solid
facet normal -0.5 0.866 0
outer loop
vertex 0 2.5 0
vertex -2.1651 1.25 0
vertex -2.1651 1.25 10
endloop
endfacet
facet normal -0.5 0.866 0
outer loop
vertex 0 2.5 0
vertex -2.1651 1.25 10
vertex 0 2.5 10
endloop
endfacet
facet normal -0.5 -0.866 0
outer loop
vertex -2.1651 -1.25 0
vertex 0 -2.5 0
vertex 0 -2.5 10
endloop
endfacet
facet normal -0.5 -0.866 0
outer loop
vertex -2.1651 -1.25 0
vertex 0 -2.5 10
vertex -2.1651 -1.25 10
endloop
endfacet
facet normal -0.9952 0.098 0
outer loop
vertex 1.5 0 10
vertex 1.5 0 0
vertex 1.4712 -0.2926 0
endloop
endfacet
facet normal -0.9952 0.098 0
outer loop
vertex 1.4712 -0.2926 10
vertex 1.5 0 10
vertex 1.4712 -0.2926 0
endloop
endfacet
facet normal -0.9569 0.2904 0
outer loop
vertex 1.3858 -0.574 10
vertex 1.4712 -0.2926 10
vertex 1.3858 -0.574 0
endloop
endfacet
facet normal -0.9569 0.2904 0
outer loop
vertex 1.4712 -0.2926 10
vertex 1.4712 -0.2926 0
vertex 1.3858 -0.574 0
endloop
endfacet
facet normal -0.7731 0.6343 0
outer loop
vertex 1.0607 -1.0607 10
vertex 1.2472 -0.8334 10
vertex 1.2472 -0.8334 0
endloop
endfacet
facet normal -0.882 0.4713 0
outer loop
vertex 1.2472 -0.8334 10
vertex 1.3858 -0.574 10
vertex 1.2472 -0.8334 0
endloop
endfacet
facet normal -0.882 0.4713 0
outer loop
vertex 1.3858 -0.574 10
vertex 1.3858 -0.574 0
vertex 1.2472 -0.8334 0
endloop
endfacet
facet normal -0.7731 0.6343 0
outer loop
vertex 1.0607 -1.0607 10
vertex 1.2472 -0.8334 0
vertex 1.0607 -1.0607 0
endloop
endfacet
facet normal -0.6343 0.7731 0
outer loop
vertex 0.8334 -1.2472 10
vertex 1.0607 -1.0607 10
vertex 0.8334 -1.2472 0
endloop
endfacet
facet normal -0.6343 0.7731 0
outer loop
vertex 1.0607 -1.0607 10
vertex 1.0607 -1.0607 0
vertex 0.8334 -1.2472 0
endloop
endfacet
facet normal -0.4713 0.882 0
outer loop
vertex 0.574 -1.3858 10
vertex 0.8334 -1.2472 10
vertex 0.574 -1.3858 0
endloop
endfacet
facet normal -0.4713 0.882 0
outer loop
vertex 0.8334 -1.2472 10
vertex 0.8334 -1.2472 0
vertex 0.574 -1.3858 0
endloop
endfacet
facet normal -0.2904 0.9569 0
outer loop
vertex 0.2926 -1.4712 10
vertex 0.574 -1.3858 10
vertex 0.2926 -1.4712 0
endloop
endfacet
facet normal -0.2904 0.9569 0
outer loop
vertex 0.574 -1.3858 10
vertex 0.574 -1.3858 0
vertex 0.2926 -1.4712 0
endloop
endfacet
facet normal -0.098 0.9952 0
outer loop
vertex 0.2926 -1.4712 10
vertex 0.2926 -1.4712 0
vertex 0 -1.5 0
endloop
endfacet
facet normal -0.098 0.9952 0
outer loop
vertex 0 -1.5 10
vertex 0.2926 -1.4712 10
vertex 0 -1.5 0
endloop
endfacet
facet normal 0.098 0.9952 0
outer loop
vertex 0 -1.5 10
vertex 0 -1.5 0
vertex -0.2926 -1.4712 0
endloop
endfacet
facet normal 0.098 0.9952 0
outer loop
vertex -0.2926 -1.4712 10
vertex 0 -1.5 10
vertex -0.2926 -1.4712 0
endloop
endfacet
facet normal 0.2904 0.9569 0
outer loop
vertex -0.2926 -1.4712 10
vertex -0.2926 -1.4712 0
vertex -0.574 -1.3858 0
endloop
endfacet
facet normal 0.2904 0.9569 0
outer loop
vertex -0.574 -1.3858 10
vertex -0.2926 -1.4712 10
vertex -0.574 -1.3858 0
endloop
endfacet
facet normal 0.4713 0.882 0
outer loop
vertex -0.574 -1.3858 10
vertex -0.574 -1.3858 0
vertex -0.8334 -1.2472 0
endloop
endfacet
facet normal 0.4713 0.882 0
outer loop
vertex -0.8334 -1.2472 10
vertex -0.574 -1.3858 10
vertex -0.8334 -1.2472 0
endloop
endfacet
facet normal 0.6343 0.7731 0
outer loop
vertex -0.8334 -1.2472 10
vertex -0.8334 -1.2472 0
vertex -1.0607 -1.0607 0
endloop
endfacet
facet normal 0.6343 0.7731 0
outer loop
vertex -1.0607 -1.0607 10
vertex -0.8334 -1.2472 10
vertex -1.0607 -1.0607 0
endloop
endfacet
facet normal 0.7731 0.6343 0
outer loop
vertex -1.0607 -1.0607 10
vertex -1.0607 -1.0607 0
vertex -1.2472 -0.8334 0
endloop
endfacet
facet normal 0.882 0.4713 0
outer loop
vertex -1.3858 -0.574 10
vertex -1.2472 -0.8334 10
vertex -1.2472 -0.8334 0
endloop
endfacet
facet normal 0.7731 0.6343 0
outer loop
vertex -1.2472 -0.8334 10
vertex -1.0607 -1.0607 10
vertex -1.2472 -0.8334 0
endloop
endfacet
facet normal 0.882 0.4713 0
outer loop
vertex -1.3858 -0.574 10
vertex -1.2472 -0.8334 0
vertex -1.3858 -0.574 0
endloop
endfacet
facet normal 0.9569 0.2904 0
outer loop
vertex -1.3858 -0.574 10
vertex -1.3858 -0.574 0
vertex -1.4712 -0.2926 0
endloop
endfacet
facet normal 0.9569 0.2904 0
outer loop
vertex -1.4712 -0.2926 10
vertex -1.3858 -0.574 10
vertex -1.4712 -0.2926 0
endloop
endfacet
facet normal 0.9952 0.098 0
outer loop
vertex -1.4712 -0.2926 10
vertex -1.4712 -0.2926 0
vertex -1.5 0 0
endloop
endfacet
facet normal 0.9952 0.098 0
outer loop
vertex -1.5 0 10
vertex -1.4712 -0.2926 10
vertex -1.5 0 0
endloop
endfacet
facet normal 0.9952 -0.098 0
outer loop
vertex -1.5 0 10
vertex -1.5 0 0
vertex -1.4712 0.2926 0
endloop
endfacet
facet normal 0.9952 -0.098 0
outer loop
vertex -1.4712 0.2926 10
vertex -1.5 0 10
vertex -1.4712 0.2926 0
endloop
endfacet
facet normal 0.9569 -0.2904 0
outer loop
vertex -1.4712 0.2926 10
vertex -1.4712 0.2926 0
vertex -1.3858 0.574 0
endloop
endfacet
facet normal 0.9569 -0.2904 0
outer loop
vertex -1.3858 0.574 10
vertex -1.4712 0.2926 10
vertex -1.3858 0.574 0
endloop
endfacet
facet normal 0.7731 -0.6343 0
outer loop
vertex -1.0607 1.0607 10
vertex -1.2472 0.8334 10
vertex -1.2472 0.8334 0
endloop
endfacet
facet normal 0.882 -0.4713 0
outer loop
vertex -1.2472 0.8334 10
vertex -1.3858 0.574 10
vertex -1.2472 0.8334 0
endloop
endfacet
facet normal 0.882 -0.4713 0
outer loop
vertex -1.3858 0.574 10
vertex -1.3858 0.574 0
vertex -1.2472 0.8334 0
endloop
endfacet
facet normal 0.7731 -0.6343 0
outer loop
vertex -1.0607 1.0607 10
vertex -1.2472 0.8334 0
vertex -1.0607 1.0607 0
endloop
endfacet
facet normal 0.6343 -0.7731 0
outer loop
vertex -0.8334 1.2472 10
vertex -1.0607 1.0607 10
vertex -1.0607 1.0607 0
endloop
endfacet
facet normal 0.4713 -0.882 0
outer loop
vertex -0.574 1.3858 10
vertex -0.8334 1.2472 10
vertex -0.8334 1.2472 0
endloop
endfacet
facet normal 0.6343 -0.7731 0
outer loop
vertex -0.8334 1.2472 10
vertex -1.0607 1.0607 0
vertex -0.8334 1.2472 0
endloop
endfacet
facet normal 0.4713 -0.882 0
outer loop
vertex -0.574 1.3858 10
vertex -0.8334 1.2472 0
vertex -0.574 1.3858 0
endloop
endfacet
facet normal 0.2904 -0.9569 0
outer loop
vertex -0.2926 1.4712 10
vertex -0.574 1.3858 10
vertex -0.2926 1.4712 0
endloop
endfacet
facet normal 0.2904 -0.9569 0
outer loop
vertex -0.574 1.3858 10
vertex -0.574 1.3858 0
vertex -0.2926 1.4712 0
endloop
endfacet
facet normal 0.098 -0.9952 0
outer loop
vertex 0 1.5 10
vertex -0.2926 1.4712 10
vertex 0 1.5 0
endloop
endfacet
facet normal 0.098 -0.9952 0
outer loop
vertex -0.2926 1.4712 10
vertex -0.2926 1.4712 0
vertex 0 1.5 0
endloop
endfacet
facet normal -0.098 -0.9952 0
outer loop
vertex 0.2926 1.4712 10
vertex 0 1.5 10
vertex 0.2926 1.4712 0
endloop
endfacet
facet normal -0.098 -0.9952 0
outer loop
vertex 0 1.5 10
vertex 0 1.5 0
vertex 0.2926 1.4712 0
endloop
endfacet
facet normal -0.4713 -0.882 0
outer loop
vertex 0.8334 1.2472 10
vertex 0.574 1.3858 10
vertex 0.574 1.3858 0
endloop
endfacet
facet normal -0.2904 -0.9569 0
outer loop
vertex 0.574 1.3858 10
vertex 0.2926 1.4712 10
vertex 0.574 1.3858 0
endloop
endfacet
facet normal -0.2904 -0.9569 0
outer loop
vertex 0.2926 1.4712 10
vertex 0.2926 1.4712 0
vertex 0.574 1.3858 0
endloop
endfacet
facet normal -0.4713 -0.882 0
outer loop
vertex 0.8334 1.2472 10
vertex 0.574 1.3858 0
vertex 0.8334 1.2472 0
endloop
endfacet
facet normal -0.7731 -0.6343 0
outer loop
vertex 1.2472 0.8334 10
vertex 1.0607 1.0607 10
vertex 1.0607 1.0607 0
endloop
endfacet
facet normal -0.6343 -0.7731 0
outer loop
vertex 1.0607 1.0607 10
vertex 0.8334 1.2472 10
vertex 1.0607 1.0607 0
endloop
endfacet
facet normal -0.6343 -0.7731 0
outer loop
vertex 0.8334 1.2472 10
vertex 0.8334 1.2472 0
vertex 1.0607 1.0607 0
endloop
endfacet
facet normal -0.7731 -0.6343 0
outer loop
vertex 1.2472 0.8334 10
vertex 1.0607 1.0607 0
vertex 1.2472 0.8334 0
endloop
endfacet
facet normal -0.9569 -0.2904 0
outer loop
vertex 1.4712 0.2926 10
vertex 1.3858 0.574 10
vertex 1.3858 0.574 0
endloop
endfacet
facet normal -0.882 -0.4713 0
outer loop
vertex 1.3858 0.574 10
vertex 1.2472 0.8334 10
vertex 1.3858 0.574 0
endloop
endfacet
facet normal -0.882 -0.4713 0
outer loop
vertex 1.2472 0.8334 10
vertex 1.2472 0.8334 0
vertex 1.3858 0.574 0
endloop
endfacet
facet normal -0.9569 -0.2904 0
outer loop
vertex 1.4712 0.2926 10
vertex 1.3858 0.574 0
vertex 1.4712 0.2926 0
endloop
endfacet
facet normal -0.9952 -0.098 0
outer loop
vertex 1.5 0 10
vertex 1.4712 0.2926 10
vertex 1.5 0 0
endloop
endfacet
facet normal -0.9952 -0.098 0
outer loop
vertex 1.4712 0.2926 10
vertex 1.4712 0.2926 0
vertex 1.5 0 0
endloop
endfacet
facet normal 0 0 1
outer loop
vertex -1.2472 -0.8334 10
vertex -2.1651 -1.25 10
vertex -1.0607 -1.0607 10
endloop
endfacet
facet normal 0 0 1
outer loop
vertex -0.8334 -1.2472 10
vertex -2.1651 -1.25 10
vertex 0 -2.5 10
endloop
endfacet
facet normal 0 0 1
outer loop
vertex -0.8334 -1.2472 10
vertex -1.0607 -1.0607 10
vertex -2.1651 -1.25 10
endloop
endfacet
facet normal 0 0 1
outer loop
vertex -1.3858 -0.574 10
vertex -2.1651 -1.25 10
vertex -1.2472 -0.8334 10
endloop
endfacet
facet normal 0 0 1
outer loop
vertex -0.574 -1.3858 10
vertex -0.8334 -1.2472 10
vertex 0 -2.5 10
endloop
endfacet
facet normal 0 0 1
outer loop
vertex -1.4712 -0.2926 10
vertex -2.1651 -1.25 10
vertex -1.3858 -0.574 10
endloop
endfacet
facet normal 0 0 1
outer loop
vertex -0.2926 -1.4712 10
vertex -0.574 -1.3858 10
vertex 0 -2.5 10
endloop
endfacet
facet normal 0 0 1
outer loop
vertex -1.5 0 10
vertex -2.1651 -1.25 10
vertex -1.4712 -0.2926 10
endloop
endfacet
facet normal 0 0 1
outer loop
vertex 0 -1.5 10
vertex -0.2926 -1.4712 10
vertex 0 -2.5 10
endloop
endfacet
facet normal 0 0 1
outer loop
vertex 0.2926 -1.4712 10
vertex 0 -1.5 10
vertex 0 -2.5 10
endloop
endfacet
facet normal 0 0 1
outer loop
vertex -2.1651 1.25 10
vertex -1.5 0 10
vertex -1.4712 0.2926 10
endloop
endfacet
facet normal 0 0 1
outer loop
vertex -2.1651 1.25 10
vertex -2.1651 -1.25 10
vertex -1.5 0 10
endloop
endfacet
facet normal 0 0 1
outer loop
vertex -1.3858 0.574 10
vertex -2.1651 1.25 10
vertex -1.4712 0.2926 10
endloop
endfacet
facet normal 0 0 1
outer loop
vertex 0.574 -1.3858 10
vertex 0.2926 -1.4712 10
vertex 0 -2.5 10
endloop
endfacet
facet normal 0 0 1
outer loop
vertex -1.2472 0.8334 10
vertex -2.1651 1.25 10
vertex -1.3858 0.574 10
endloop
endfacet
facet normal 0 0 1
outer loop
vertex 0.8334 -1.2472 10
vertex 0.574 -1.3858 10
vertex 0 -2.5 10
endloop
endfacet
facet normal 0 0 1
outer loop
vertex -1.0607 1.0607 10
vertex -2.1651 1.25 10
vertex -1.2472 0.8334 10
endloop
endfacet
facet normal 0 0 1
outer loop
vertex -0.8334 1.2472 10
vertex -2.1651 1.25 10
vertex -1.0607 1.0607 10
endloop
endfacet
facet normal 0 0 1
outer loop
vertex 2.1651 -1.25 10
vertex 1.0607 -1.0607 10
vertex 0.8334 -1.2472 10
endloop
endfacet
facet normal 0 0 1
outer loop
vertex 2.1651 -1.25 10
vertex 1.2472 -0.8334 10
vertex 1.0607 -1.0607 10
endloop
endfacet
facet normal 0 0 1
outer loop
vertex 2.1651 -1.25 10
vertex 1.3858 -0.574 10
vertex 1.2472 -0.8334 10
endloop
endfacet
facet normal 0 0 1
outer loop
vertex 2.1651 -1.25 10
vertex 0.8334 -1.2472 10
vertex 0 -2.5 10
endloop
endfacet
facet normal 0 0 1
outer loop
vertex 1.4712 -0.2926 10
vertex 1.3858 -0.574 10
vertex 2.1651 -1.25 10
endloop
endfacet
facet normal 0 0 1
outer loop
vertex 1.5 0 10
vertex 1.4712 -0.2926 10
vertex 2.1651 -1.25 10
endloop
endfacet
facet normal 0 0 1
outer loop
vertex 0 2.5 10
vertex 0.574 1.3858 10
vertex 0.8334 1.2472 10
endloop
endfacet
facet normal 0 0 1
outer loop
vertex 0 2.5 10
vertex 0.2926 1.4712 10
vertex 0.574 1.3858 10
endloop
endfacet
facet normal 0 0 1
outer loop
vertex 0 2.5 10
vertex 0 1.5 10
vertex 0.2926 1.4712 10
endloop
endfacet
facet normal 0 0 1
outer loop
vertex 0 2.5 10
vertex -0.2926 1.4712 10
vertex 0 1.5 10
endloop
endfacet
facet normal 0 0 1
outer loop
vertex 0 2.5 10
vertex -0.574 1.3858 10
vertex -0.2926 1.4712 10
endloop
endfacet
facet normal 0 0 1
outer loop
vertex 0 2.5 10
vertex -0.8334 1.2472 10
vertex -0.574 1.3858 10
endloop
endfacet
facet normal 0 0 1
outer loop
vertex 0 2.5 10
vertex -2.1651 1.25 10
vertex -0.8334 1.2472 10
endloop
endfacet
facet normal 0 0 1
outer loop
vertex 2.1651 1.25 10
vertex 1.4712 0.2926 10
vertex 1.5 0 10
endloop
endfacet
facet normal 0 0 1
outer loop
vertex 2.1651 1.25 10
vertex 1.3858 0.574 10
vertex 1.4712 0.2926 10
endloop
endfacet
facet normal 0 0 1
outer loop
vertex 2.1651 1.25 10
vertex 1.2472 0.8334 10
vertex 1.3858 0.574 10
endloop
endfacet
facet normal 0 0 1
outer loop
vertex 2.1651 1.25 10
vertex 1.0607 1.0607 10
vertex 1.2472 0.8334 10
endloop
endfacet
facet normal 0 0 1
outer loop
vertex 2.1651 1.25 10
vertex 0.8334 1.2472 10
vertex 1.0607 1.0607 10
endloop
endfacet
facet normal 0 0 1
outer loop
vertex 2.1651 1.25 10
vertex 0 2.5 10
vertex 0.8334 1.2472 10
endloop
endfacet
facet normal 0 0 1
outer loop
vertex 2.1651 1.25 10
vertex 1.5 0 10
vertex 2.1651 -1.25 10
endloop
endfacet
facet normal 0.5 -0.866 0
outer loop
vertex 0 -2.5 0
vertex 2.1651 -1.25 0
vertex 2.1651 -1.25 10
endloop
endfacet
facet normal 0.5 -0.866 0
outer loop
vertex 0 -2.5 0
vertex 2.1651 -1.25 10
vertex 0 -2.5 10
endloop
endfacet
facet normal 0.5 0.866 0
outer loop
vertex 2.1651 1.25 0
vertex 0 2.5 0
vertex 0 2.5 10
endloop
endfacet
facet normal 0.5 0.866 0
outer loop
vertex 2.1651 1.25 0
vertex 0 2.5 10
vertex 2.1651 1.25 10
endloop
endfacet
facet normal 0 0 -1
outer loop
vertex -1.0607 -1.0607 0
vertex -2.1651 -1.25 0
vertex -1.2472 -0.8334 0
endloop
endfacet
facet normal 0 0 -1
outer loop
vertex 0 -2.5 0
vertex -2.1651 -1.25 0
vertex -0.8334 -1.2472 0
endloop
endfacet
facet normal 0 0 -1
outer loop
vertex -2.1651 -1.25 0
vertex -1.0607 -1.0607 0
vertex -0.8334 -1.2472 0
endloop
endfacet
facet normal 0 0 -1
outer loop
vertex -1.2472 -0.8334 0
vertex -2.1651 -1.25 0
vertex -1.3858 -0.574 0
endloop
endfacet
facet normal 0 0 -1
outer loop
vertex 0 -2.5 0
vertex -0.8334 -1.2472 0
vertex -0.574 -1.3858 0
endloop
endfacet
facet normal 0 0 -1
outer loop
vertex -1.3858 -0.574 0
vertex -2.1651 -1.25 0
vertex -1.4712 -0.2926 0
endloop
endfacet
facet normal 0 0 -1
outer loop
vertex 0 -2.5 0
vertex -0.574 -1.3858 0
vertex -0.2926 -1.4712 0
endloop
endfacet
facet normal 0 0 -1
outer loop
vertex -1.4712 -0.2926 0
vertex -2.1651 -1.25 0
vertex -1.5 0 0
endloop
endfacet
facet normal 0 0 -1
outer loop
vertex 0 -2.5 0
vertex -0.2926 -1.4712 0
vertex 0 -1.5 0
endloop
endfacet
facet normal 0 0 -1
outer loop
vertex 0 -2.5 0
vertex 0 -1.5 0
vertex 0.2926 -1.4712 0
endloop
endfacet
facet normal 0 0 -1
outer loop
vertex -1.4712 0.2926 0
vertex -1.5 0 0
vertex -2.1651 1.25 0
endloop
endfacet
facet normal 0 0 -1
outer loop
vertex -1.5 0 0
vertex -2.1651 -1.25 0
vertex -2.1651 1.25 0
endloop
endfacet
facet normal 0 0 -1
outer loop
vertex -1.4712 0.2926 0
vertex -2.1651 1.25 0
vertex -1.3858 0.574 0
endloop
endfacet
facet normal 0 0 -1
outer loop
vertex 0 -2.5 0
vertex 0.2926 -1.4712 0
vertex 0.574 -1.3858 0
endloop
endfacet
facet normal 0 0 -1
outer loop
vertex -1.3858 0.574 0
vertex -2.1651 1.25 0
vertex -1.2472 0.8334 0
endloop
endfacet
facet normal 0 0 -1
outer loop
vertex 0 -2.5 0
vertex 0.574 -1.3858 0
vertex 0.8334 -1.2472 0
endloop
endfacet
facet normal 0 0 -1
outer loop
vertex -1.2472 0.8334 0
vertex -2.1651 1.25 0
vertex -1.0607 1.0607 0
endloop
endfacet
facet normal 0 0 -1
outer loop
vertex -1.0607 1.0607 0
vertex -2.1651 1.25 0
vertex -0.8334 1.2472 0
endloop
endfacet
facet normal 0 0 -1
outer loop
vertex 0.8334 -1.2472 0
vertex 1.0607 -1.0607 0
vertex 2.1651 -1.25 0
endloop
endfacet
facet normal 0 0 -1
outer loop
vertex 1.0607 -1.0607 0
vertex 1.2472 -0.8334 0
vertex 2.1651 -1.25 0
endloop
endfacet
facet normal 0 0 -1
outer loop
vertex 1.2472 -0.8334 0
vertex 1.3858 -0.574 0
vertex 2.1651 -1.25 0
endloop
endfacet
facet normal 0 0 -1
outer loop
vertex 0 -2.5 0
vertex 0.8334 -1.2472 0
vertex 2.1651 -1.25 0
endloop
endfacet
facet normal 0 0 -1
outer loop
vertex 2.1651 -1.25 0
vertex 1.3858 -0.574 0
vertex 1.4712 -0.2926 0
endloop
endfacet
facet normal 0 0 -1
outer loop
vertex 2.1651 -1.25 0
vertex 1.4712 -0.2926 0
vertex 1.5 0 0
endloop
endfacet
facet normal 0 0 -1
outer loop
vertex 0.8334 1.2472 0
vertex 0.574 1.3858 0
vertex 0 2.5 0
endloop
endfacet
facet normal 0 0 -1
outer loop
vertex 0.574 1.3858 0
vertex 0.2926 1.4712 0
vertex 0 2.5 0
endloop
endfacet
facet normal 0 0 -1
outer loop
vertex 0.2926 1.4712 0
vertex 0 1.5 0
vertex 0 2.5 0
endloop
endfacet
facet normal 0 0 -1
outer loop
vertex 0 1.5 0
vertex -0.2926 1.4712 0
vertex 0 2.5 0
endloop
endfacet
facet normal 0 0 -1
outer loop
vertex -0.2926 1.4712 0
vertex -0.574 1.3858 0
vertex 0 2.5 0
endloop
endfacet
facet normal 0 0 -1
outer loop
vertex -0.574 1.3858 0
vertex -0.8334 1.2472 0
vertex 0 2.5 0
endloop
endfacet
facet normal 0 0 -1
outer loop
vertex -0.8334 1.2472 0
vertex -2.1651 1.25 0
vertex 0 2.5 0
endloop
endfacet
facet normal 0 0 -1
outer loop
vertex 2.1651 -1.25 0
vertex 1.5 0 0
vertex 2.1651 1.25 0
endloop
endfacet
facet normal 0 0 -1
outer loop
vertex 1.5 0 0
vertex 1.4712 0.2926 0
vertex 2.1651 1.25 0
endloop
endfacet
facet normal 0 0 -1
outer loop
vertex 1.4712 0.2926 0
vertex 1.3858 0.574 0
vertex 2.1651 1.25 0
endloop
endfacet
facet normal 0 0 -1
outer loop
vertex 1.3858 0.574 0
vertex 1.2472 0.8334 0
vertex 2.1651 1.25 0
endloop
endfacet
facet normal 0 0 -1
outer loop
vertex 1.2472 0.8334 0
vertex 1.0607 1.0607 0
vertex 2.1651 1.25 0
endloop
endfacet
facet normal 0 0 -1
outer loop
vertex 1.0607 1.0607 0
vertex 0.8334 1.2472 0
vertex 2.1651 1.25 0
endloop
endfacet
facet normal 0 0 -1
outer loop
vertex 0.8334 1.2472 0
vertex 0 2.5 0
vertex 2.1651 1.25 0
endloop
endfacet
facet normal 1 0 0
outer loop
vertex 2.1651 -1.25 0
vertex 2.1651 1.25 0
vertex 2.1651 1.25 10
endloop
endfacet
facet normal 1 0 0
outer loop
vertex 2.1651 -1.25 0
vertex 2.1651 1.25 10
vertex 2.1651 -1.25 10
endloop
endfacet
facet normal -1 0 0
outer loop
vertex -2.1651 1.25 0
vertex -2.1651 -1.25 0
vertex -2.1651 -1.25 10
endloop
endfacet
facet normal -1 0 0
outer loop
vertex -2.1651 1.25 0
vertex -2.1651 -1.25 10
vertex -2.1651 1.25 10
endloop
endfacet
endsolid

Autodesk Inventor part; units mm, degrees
ref_plane "YZ Plane" through (0, 0, 0) normal (1, 0, 0) x (0, 1, 0)
ref_plane "XZ Plane" through (0, 0, 0) normal (0, 1, 0) x (-1, 0, 0)
ref_plane "XY Plane" through (0, 0, 0) normal (0, 0, 1) x (1, 0, 0)
sketch "Эскиз1" plane through (0, 0, 0) normal (0, 0, 1) x (1, 0, 0)
  circle A0 centre (0, 0) radius 1.5
  circle A1 centre (0, 0) radius 2.5 construction
  line L0 (-2.1651, 1.25) -> (0, 2.5)
  line L1 (0, 2.5) -> (2.1651, 1.25)
  line L2 (2.1651, 1.25) -> (2.1651, -1.25)
  line L3 (2.1651, -1.25) -> (0, -2.5)
  line L4 (0, -2.5) -> (-2.1651, -1.25)
  line L5 (-2.1651, -1.25) -> (-2.1651, 1.25)
  dimension "d1" = 5
  dimension "d0" = 3
extrude "Выдавливание1" add sketch "Эскиз1" along normal blind 10
properties part number "стойка для платы 10мм" material "Латунь, мягкая, желтая"
